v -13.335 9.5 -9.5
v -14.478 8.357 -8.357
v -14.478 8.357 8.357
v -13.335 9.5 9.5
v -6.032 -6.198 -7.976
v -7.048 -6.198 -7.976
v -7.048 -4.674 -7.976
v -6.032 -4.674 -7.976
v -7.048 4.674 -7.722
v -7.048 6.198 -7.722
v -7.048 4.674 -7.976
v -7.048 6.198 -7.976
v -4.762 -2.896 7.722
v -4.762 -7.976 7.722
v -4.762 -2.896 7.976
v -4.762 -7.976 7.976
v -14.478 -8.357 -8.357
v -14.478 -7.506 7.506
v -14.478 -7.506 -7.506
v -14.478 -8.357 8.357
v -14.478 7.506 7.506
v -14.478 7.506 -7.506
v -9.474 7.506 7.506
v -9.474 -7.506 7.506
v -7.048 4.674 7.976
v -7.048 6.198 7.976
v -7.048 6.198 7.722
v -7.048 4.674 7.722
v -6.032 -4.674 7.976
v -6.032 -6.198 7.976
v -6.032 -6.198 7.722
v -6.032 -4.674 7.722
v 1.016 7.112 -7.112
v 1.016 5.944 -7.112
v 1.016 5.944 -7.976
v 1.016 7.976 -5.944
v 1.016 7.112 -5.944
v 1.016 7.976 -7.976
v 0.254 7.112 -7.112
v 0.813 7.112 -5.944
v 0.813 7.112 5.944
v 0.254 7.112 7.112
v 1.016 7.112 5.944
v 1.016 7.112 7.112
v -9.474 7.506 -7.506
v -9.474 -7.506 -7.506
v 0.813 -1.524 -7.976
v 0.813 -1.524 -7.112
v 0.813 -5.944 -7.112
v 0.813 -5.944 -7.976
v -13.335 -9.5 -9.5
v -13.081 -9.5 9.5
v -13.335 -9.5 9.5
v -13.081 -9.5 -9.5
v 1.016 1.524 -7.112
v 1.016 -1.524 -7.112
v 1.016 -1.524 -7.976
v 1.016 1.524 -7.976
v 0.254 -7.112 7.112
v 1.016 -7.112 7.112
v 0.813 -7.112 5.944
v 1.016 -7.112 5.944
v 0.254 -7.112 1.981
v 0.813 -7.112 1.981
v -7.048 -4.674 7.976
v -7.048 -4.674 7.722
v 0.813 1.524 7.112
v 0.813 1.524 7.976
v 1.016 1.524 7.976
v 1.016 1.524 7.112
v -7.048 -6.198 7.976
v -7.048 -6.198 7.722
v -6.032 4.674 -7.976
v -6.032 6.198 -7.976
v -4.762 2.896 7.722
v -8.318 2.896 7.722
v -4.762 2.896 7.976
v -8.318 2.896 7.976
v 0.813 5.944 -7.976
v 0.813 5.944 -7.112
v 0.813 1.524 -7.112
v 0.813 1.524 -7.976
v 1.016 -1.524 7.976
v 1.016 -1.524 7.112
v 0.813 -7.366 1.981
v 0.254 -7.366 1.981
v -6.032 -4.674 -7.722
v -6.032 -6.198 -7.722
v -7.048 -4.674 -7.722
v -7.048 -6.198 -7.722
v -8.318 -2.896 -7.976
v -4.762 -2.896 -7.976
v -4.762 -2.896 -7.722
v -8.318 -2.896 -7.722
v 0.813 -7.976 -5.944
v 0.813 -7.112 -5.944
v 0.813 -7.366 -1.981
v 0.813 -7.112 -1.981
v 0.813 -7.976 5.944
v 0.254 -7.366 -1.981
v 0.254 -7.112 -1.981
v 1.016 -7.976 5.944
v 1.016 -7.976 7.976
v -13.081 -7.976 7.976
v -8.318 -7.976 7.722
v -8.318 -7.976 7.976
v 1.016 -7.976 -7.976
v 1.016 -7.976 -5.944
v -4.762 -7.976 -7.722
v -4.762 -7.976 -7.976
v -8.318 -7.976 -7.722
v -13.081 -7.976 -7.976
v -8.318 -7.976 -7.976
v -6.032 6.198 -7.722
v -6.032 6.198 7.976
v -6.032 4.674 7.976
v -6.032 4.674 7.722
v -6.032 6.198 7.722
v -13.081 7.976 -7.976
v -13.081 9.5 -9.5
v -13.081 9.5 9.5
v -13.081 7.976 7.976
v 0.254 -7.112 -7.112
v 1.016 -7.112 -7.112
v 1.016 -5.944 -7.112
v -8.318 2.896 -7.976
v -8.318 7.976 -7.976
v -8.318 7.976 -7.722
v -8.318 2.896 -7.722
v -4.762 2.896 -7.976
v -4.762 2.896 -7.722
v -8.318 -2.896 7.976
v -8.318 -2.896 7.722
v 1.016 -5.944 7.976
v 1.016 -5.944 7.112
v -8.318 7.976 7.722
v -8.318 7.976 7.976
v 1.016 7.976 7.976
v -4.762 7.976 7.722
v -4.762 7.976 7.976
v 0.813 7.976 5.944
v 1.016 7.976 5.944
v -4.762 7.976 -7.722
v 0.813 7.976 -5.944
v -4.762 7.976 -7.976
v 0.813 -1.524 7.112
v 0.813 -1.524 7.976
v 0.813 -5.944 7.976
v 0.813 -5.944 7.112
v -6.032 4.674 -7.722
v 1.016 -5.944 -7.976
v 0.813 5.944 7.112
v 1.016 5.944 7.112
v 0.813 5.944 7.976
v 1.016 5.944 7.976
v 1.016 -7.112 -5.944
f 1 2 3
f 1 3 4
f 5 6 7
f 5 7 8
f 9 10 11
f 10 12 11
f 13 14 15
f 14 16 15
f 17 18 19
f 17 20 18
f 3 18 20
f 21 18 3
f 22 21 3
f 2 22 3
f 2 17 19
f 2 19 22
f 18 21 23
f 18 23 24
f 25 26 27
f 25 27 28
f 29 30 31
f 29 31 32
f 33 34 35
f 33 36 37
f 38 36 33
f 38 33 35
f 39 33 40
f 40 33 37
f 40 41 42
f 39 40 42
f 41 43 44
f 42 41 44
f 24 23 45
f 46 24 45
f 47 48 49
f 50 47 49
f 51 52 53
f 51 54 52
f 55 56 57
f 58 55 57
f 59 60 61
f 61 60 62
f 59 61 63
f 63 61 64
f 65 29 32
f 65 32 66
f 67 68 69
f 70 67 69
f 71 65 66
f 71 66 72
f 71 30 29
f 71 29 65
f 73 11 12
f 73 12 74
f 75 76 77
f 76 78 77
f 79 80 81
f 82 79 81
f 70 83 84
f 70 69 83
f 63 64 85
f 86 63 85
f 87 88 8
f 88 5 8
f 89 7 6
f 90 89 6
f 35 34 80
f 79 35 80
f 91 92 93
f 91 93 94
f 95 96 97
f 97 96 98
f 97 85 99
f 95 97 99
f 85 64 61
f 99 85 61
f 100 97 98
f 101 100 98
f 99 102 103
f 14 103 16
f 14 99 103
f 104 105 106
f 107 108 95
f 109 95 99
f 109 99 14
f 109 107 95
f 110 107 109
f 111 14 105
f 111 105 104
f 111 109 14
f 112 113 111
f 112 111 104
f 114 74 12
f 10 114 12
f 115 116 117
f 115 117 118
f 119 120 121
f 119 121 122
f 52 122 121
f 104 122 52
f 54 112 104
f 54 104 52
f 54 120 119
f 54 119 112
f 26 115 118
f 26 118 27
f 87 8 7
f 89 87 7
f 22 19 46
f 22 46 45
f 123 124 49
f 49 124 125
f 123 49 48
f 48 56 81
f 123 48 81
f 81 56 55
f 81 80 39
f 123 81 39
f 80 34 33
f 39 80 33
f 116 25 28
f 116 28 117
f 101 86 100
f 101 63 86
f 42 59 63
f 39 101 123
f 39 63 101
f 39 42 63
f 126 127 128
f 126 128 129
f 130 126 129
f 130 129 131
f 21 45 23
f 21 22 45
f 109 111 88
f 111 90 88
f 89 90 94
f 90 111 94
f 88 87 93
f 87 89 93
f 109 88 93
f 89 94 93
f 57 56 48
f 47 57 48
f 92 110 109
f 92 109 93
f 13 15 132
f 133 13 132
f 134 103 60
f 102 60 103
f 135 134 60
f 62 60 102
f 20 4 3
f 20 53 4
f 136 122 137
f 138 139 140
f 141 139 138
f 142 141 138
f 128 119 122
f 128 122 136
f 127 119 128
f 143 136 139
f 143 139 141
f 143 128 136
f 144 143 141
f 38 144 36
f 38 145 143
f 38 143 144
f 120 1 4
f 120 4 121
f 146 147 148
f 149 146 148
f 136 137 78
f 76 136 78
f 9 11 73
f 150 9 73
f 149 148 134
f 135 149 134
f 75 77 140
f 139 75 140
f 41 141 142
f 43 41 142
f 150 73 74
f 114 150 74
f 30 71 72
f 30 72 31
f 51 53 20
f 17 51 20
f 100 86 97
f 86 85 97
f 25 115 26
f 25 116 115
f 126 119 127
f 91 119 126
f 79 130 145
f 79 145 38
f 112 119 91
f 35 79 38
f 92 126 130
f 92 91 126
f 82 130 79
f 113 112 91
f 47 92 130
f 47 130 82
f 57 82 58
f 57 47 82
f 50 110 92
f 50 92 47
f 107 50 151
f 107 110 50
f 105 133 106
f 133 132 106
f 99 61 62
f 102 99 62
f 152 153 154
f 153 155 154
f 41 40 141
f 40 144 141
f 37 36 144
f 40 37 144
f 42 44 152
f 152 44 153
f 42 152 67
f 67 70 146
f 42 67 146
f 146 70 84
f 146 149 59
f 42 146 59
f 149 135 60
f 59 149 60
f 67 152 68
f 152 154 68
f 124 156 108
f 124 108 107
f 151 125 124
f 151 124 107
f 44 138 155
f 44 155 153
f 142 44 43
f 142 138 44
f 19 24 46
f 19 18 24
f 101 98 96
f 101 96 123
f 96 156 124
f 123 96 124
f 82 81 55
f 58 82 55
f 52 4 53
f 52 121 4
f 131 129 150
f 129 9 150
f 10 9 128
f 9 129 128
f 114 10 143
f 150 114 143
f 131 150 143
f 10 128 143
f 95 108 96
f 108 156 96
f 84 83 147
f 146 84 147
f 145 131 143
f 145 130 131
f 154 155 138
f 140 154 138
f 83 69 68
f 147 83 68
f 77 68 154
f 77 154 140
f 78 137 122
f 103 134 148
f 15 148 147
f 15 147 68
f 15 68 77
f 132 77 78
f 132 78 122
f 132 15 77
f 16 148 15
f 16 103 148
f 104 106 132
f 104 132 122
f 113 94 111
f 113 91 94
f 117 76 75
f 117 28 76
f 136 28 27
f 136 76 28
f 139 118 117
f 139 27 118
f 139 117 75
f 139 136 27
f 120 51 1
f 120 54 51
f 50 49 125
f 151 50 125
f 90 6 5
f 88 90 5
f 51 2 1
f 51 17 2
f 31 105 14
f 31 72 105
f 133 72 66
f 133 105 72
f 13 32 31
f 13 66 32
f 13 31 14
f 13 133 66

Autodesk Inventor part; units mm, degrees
sketch "Sketch_11" plane through (1.016, 0, 0) normal (1, 0, 0) x (0, 0, -1)
  line L0 (-9.4996, 9.4996) -> (-9.4996, -9.4996)
  line L1 (-9.4996, -9.4996) -> (9.4996, -9.4996)
  line L2 (9.4996, -9.4996) -> (9.4996, 9.4996)
  line L3 (9.4996, 9.4996) -> (-9.4996, 9.4996)
extrude "Extrusion1" add sketch "Sketch_11" against normal blind 15.494
sketch "Sketch_12" plane through (0, 0, 0) normal (0, 0, 1) x (1, 0, 0)
  line L0 (-20.32, 12.8016) -> (-20.32, -12.8016)
  line L1 (-20.32, -12.8016) -> (1.016, -12.8016)
  line L2 (1.016, -12.8016) -> (1.016, -7.9756)
  line L3 (1.016, -7.9756) -> (-13.081, -7.9756)
  line L4 (-13.081, -7.9756) -> (-13.081, -9.4996)
  line L5 (-13.081, -9.4996) -> (-13.335, -9.4996)
  line L6 (-13.335, -9.4996) -> (-14.478, -8.3566)
  line L7 (-14.478, -8.3566) -> (-14.478, 8.3566)
  line L8 (-14.478, 8.3566) -> (-13.335, 9.4996)
  line L9 (-13.335, 9.4996) -> (-13.081, 9.4996)
  line L10 (-13.081, 9.4996) -> (-13.081, 7.9756)
  line L11 (-13.081, 7.9756) -> (1.016, 7.9756)
  line L12 (1.016, 7.9756) -> (1.016, 12.8016)
  line L13 (1.016, 12.8016) -> (-20.32, 12.8016)
extrude "Extrusion2" cut sketch "Sketch_12" along normal mid plane 18.9992
sketch "Sketch_13" plane through (0, 0, 0) normal (0, 1, 0) x (-1, 0, 0)
  line L0 (20.32, -12.8016) -> (20.32, 12.8016)
  line L1 (20.32, 12.8016) -> (-1.016, 12.8016)
  line L2 (-1.016, 12.8016) -> (-1.016, 7.9756)
  line L3 (-1.016, 7.9756) -> (13.081, 7.9756)
  line L4 (13.081, 7.9756) -> (13.081, 9.4996)
  line L5 (13.081, 9.4996) -> (13.335, 9.4996)
  line L6 (13.335, 9.4996) -> (14.478, 8.3566)
  line L7 (14.478, 8.3566) -> (14.478, -8.3566)
  line L8 (14.478, -8.3566) -> (13.335, -9.4996)
  line L9 (13.335, -9.4996) -> (13.081, -9.4996)
  line L10 (13.081, -9.4996) -> (13.081, -7.9756)
  line L11 (13.081, -7.9756) -> (-1.016, -7.9756)
  line L12 (-1.016, -7.9756) -> (-1.016, -12.8016)
  line L13 (-1.016, -12.8016) -> (20.32, -12.8016)
extrude "Extrusion3" cut sketch "Sketch_13" along normal mid plane 18.9992
sketch "Sketch_14" plane through (1.016, 0, 0) normal (1, 0, 0) x (0, 0, -1)
  line L0 (-7.112, -7.112) -> (-1.9812, -7.112)
  line L1 (-1.9812, -7.112) -> (-1.9812, -7.366)
  line L2 (-1.9812, -7.366) -> (1.9812, -7.366)
  line L3 (1.9812, -7.366) -> (1.9812, -7.112)
  line L4 (1.9812, -7.112) -> (7.112, -7.112)
  line L5 (7.112, -7.112) -> (7.112, 7.112)
  line L6 (7.112, 7.112) -> (-7.112, 7.112)
  line L7 (-7.112, 7.112) -> (-7.112, -7.112)
extrude "Extrusion4" cut sketch "Sketch_14" against normal blind 0.762
sketch "Sketch_15" plane through (0, 0, 7.9756) normal (0, 0, 1) x (1, 0, 0)
  line L0 (0.8128, 5.9436) -> (0.8128, 1.524)
  line L1 (0.8128, 1.524) -> (1.016, 1.524)
  line L2 (1.016, 1.524) -> (1.016, 5.9436)
  line L3 (1.016, 5.9436) -> (0.8128, 5.9436)
extrude "Extrusion5" cut sketch "Sketch_15" against normal blind 15.9512
sketch "Sketch_16" plane through (0, 0, 7.9756) normal (0, 0, 1) x (1, 0, 0)
  line L0 (0.8128, -5.9436) -> (1.016, -5.9436)
  line L1 (1.016, -5.9436) -> (1.016, -1.524)
  line L2 (1.016, -1.524) -> (0.8128, -1.524)
  line L3 (0.8128, -1.524) -> (0.8128, -5.9436)
extrude "Extrusion6" cut sketch "Sketch_16" against normal blind 15.9512
sketch "Sketch_17" plane through (0, 7.9756, 0) normal (0, 1, 0) x (1, 0, 0)
  line L0 (0.8128, 5.9436) -> (0.8128, -5.9436)
  line L1 (0.8128, -5.9436) -> (1.016, -5.9436)
  line L2 (1.016, -5.9436) -> (1.016, 5.9436)
  line L3 (1.016, 5.9436) -> (0.8128, 5.9436)
extrude "Extrusion7" cut sketch "Sketch_17" against normal blind 15.9512
sketch "Sketch_48" plane through (0, 0, 7.9756) normal (0, 0, 1) x (1, 0, 0)
  line L0 (-8.3185, 7.9756) -> (-8.3185, 2.8956)
  line L1 (-8.3185, 2.8956) -> (-4.7625, 2.8956)
  line L2 (-4.7625, 2.8956) -> (-4.7625, 7.9756)
  line L3 (-4.7625, 7.9756) -> (-8.3185, 7.9756)
  line L4 (-7.0485, 6.1976) -> (-7.0485, 4.6736)
  line L5 (-7.0485, 4.6736) -> (-6.0325, 4.6736)
  line L6 (-6.0325, 4.6736) -> (-6.0325, 6.1976)
  line L7 (-6.0325, 6.1976) -> (-7.0485, 6.1976)
extrude "Extrusion8" cut sketch "Sketch_48" against normal blind 0.254
sketch "Sketch_50" plane through (0, 0, 7.9756) normal (0, 0, 1) x (1, 0, 0)
  line L0 (-8.3185, -7.9756) -> (-4.7625, -7.9756)
  line L1 (-4.7625, -7.9756) -> (-4.7625, -2.8956)
  line L2 (-4.7625, -2.8956) -> (-8.3185, -2.8956)
  line L3 (-8.3185, -2.8956) -> (-8.3185, -7.9756)
  line L4 (-7.0485, -6.1976) -> (-6.0325, -6.1976)
  line L5 (-6.0325, -6.1976) -> (-6.0325, -4.6736)
  line L6 (-6.0325, -4.6736) -> (-7.0485, -4.6736)
  line L7 (-7.0485, -4.6736) -> (-7.0485, -6.1976)
extrude "Extrusion9" cut sketch "Sketch_50" against normal blind 0.254
sketch "Sketch_51" plane through (0, 0, -7.9756) normal (0, 0, 1) x (1, 0, 0)
  line L0 (-8.3185, 7.9756) -> (-8.3185, 2.8956)
  line L1 (-8.3185, 2.8956) -> (-4.7625, 2.8956)
  line L2 (-4.7625, 2.8956) -> (-4.7625, 7.9756)
  line L3 (-4.7625, 7.9756) -> (-8.3185, 7.9756)
  line L4 (-7.0485, 6.1976) -> (-7.0485, 4.6736)
  line L5 (-7.0485, 4.6736) -> (-6.0325, 4.6736)
  line L6 (-6.0325, 4.6736) -> (-6.0325, 6.1976)
  line L7 (-6.0325, 6.1976) -> (-7.0485, 6.1976)
extrude "Extrusion10" cut sketch "Sketch_51" along normal blind 0.254
sketch "Sketch_52" plane through (0, 0, -7.9756) normal (0, 0, 1) x (1, 0, 0)
  line L0 (-8.3185, -7.9756) -> (-4.7625, -7.9756)
  line L1 (-4.7625, -7.9756) -> (-4.7625, -2.8956)
  line L2 (-4.7625, -2.8956) -> (-8.3185, -2.8956)
  line L3 (-8.3185, -2.8956) -> (-8.3185, -7.9756)
  line L4 (-7.0485, -6.1976) -> (-6.0325, -6.1976)
  line L5 (-6.0325, -6.1976) -> (-6.0325, -4.6736)
  line L6 (-6.0325, -4.6736) -> (-7.0485, -4.6736)
  line L7 (-7.0485, -4.6736) -> (-7.0485, -6.1976)
extrude "Extrusion11" cut sketch "Sketch_52" along normal blind 0.254
sketch "Sketch_21" plane through (-14.478, 0, 0) normal (1, 0, 0) x (0, 0, -1)
  line L0 (-7.5057, -7.5057) -> (7.5057, -7.5057)
  line L1 (7.5057, -7.5057) -> (7.5057, 7.5057)
  line L2 (7.5057, 7.5057) -> (-7.5057, 7.5057)
  line L3 (-7.5057, 7.5057) -> (-7.5057, -7.5057)
extrude "Extrusion12" cut sketch "Sketch_21" along normal blind 5.0038
ref_plane "body_to_diffuser_kk23_XY" through (-11.8872, 0, 0) normal (1, 0, 0) x (0, 0, -1)
ref_plane "body_to_diffuser_kk23_YZ" through (-11.8872, 0, 0) normal (0, 0, -1) x (0, 1, 0)
ref_plane "body_to_diffuser_kk23_ZX" through (-11.8872, 0, 0) normal (0, 1, 0) x (1, 0, 0)
ref_plane "body_to_metal_XY" through (-0.508, 0, 0) normal (-1, 0, 0) x (0, 0, -1)
ref_plane "body_to_metal_YZ" through (-0.508, 0, 0) normal (0, 0, -1) x (0, -1, 0)
ref_plane "body_to_metal_ZX" through (-0.508, 0, 0) normal (0, -1, 0) x (-1, 0, 0)
ref_plane "body_to_pole_XY" through (-0.508, 0, 0) normal (-1, 0, 0) x (0, 0, -1)
ref_plane "body_to_pole_YZ" through (-0.508, 0, 0) normal (0, 0, -1) x (0, -1, 0)
ref_plane "body_to_pole_ZX" through (-0.508, 0, 0) normal (0, -1, 0) x (-1, 0, 0)
properties part number "UB216KKW015C-NR"
